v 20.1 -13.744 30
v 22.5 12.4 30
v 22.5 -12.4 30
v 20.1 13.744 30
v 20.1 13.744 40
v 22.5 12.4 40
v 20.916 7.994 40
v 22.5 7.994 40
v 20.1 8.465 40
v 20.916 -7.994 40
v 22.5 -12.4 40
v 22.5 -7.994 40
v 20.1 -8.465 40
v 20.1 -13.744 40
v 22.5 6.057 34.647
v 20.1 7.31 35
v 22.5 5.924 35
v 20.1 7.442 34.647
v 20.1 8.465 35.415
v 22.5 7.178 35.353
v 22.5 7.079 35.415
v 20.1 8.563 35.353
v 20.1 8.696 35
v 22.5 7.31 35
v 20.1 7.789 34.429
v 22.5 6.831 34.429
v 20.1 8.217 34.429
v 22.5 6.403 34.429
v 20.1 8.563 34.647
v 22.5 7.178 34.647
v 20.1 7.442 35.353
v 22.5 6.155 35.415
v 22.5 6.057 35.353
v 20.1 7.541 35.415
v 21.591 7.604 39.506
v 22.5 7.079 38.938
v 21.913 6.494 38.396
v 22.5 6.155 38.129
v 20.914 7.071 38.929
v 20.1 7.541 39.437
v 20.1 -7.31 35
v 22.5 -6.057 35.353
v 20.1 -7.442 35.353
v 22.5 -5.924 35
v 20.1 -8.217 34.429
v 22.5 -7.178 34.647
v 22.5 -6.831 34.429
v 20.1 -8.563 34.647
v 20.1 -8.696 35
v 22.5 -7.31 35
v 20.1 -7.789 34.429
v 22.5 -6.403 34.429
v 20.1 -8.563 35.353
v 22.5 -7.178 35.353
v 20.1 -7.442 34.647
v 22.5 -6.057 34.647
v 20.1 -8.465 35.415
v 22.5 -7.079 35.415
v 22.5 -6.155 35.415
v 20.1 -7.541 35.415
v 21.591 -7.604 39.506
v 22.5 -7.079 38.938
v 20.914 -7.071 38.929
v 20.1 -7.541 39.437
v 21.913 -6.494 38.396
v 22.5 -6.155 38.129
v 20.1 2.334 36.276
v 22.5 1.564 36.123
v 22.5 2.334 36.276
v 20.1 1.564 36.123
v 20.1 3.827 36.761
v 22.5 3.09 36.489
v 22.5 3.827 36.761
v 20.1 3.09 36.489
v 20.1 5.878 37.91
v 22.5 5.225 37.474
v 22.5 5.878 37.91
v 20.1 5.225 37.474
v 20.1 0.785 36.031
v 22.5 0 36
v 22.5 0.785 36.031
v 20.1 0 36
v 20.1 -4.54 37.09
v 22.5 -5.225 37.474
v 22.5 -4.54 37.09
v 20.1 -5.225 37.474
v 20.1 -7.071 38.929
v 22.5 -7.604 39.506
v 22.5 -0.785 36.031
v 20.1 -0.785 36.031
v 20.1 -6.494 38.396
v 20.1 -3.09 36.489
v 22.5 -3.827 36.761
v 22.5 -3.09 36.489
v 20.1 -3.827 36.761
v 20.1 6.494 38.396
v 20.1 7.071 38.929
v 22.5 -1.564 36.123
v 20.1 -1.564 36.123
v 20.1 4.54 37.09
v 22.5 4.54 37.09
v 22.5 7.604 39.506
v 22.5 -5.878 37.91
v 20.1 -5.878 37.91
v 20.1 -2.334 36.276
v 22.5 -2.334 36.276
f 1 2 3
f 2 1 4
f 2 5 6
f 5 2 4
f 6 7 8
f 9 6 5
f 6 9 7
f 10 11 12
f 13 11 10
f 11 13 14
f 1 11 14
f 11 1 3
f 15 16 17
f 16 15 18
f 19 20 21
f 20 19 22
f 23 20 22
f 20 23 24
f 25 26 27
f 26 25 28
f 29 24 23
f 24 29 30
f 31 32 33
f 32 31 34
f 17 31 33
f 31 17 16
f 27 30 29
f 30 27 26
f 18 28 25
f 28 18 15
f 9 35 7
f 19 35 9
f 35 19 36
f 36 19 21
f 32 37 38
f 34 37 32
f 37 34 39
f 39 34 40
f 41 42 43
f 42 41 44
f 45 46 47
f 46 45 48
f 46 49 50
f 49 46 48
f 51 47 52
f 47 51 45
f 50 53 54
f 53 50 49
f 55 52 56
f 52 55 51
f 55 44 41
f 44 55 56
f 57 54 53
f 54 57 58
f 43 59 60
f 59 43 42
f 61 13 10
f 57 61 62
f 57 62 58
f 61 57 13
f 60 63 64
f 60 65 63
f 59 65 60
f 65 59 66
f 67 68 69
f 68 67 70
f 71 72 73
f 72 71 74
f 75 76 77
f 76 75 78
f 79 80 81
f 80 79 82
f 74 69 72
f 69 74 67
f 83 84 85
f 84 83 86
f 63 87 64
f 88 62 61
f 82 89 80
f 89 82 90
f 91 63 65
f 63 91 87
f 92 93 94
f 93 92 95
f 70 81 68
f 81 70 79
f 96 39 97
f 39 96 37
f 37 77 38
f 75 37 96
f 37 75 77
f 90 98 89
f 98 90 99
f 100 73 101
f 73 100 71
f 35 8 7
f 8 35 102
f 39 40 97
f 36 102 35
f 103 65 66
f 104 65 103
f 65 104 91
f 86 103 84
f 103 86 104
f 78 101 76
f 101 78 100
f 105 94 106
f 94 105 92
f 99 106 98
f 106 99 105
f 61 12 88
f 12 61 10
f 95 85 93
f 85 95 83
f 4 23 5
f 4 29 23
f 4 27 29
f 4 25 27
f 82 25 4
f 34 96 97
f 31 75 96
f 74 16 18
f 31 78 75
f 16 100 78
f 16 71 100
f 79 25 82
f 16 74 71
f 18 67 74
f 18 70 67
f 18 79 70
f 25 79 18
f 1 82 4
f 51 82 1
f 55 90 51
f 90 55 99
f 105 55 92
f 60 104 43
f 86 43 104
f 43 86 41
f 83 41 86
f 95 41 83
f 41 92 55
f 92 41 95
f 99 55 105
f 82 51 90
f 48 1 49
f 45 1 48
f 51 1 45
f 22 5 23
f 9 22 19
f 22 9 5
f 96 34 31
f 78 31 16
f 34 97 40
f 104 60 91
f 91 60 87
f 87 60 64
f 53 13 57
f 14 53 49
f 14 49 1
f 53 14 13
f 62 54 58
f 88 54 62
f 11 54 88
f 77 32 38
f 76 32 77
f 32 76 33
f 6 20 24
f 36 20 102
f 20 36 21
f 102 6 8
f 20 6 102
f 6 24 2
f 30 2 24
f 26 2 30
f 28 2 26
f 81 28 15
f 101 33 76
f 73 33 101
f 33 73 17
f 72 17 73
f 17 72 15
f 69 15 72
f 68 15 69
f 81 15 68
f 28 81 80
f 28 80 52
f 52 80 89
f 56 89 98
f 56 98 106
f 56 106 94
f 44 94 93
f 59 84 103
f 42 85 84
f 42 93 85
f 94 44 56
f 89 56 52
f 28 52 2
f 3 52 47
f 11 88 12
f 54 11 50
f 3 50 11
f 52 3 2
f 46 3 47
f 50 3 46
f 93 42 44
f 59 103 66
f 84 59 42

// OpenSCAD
module slidingSlot(){
	difference(){
		rotate_extrude(){
			translate([40,0,0])
			polygon(points=[[0,0],[16,0],[16,10],[11,10],[11,7],[13,4],[13,3],[3,3],[3,4],[5,7],[5,10],[0,10]]);
		}
		translate([0,0,-5])
		linear_extrude(height=20)
		polygon(points=[[60,60],[-60,60],[0,0],[-60,-60],[60,-60]]);
	}
}

module waterNeedleHolder(xx,yy,zz){
	difference(){
		union(){
			// translate([5,0,zz+8])
			// rotate([90,0,90])
			// linear_extrude(height=15)
			// polygon(points=[[1,0],[1,5],[2,5],[0,12],[-2,5],[-1,5],[-1,0]]);
			
			//Top Scaffold Adaptor
			translate([10,0,zz]){
				cylinder(d=4.9,h=50,$fn=20);
				cylinder(d1=13,d2=5,h=35,$fn=30);
			}
		
			//Base
			translate([xx,yy,zz])
			linear_extrude(height=10)
			polygon(points=[[25,11],[25,-11],[0,-25],[0,25]]);

			//Odor Tube
			translate([xx,yy,zz+10])
			rotate([0,90,0])	
			cylinder(h=25,d=6,$fn=20);
			
			//Back Odor Tube Adaptor
			// translate([xx,yy,zz+9])
			// rotate([0,-90,0])
			// rotate_extrude($fn=20)
			// polygon(points=[[0,0],[1.2,0],[1.2,4],[1.4,4],[0,8]]);			
		}
		
		//Bottom Groove
		translate([xx,yy,zz-5])
		linear_extrude(height=10)
		polygon(points=[[15,6],[15,-6],[0,-14],[0,14]]);

		// //Nose Groove
		translate([xx+18,yy,zz+16])
		rotate([0,90,0])
		cylinder(h=20,d=20,$fn=80);
		
		// //Odor Tube
		// translate([xx+5,yy,zz+9])
		// rotate([0,90,0])
		// cylinder(h=32,d=2.5,$fn=20);
		
		//Odor Tube
		translate([xx-15,yy,zz+10])
		rotate([0,90,0])
		cylinder(h=60,d=4,$fn=20);
		
		//Left Needle Slot
		translate([xx-18,yy+30,zz+5])
		rotate([90,0,60]){
			cylinder(d=1.2,h=55,$fn=10);
			translate([-0.4,0,0])
			cube([0.8,10,55]);
		}
		
		//Right Needle Slot
		translate([xx-18,yy-30,zz+5])
		rotate([-90,0,-60]){
			cylinder(d=1.2,h=55,$fn=10);
			translate([-0.4,-10,0])
			cube([0.8,10,55]);
		}
	}
	
	//Odor tube fixer
	translate([2,0,zz+6]){
		cylinder(d1=4,d2=0.5,h=2.4,$fn=20);
	}
}

module measureCube(){
	translate([29,-2.25,0])
	cube([20,4.5,4.5]);
}


module functionColumn(){
	
}

module mousePlatform(){
	translate([0,-100,0])
	color("grey",1.0){
		cube([200,200,10]);
		translate([60,50,0])
		cube([20,100,20]);
	}
	translate([50,0,37.5])
	rotate([0,90,0])
	{
		difference(){	
			difference(){
				color("white",0.7){
					cylinder(d=45,h=150);
				}
				translate([0,0,-10])
				cylinder(d=35,h=170);
			}
			translate([-30,-50,-10])
			cube([20,100,170]);
		}
	}
}


// mousePlatform();
// translate([70,0,20])
// slidingSlot();
difference(){
	waterNeedleHolder(0,0,30);
	union(){
		translate([-5,-50,0])
		cube([25.1,100,100]);
		
		translate([22.5,-50,0])
		cube([50,100,100]);
	}
}
//measureCube();
